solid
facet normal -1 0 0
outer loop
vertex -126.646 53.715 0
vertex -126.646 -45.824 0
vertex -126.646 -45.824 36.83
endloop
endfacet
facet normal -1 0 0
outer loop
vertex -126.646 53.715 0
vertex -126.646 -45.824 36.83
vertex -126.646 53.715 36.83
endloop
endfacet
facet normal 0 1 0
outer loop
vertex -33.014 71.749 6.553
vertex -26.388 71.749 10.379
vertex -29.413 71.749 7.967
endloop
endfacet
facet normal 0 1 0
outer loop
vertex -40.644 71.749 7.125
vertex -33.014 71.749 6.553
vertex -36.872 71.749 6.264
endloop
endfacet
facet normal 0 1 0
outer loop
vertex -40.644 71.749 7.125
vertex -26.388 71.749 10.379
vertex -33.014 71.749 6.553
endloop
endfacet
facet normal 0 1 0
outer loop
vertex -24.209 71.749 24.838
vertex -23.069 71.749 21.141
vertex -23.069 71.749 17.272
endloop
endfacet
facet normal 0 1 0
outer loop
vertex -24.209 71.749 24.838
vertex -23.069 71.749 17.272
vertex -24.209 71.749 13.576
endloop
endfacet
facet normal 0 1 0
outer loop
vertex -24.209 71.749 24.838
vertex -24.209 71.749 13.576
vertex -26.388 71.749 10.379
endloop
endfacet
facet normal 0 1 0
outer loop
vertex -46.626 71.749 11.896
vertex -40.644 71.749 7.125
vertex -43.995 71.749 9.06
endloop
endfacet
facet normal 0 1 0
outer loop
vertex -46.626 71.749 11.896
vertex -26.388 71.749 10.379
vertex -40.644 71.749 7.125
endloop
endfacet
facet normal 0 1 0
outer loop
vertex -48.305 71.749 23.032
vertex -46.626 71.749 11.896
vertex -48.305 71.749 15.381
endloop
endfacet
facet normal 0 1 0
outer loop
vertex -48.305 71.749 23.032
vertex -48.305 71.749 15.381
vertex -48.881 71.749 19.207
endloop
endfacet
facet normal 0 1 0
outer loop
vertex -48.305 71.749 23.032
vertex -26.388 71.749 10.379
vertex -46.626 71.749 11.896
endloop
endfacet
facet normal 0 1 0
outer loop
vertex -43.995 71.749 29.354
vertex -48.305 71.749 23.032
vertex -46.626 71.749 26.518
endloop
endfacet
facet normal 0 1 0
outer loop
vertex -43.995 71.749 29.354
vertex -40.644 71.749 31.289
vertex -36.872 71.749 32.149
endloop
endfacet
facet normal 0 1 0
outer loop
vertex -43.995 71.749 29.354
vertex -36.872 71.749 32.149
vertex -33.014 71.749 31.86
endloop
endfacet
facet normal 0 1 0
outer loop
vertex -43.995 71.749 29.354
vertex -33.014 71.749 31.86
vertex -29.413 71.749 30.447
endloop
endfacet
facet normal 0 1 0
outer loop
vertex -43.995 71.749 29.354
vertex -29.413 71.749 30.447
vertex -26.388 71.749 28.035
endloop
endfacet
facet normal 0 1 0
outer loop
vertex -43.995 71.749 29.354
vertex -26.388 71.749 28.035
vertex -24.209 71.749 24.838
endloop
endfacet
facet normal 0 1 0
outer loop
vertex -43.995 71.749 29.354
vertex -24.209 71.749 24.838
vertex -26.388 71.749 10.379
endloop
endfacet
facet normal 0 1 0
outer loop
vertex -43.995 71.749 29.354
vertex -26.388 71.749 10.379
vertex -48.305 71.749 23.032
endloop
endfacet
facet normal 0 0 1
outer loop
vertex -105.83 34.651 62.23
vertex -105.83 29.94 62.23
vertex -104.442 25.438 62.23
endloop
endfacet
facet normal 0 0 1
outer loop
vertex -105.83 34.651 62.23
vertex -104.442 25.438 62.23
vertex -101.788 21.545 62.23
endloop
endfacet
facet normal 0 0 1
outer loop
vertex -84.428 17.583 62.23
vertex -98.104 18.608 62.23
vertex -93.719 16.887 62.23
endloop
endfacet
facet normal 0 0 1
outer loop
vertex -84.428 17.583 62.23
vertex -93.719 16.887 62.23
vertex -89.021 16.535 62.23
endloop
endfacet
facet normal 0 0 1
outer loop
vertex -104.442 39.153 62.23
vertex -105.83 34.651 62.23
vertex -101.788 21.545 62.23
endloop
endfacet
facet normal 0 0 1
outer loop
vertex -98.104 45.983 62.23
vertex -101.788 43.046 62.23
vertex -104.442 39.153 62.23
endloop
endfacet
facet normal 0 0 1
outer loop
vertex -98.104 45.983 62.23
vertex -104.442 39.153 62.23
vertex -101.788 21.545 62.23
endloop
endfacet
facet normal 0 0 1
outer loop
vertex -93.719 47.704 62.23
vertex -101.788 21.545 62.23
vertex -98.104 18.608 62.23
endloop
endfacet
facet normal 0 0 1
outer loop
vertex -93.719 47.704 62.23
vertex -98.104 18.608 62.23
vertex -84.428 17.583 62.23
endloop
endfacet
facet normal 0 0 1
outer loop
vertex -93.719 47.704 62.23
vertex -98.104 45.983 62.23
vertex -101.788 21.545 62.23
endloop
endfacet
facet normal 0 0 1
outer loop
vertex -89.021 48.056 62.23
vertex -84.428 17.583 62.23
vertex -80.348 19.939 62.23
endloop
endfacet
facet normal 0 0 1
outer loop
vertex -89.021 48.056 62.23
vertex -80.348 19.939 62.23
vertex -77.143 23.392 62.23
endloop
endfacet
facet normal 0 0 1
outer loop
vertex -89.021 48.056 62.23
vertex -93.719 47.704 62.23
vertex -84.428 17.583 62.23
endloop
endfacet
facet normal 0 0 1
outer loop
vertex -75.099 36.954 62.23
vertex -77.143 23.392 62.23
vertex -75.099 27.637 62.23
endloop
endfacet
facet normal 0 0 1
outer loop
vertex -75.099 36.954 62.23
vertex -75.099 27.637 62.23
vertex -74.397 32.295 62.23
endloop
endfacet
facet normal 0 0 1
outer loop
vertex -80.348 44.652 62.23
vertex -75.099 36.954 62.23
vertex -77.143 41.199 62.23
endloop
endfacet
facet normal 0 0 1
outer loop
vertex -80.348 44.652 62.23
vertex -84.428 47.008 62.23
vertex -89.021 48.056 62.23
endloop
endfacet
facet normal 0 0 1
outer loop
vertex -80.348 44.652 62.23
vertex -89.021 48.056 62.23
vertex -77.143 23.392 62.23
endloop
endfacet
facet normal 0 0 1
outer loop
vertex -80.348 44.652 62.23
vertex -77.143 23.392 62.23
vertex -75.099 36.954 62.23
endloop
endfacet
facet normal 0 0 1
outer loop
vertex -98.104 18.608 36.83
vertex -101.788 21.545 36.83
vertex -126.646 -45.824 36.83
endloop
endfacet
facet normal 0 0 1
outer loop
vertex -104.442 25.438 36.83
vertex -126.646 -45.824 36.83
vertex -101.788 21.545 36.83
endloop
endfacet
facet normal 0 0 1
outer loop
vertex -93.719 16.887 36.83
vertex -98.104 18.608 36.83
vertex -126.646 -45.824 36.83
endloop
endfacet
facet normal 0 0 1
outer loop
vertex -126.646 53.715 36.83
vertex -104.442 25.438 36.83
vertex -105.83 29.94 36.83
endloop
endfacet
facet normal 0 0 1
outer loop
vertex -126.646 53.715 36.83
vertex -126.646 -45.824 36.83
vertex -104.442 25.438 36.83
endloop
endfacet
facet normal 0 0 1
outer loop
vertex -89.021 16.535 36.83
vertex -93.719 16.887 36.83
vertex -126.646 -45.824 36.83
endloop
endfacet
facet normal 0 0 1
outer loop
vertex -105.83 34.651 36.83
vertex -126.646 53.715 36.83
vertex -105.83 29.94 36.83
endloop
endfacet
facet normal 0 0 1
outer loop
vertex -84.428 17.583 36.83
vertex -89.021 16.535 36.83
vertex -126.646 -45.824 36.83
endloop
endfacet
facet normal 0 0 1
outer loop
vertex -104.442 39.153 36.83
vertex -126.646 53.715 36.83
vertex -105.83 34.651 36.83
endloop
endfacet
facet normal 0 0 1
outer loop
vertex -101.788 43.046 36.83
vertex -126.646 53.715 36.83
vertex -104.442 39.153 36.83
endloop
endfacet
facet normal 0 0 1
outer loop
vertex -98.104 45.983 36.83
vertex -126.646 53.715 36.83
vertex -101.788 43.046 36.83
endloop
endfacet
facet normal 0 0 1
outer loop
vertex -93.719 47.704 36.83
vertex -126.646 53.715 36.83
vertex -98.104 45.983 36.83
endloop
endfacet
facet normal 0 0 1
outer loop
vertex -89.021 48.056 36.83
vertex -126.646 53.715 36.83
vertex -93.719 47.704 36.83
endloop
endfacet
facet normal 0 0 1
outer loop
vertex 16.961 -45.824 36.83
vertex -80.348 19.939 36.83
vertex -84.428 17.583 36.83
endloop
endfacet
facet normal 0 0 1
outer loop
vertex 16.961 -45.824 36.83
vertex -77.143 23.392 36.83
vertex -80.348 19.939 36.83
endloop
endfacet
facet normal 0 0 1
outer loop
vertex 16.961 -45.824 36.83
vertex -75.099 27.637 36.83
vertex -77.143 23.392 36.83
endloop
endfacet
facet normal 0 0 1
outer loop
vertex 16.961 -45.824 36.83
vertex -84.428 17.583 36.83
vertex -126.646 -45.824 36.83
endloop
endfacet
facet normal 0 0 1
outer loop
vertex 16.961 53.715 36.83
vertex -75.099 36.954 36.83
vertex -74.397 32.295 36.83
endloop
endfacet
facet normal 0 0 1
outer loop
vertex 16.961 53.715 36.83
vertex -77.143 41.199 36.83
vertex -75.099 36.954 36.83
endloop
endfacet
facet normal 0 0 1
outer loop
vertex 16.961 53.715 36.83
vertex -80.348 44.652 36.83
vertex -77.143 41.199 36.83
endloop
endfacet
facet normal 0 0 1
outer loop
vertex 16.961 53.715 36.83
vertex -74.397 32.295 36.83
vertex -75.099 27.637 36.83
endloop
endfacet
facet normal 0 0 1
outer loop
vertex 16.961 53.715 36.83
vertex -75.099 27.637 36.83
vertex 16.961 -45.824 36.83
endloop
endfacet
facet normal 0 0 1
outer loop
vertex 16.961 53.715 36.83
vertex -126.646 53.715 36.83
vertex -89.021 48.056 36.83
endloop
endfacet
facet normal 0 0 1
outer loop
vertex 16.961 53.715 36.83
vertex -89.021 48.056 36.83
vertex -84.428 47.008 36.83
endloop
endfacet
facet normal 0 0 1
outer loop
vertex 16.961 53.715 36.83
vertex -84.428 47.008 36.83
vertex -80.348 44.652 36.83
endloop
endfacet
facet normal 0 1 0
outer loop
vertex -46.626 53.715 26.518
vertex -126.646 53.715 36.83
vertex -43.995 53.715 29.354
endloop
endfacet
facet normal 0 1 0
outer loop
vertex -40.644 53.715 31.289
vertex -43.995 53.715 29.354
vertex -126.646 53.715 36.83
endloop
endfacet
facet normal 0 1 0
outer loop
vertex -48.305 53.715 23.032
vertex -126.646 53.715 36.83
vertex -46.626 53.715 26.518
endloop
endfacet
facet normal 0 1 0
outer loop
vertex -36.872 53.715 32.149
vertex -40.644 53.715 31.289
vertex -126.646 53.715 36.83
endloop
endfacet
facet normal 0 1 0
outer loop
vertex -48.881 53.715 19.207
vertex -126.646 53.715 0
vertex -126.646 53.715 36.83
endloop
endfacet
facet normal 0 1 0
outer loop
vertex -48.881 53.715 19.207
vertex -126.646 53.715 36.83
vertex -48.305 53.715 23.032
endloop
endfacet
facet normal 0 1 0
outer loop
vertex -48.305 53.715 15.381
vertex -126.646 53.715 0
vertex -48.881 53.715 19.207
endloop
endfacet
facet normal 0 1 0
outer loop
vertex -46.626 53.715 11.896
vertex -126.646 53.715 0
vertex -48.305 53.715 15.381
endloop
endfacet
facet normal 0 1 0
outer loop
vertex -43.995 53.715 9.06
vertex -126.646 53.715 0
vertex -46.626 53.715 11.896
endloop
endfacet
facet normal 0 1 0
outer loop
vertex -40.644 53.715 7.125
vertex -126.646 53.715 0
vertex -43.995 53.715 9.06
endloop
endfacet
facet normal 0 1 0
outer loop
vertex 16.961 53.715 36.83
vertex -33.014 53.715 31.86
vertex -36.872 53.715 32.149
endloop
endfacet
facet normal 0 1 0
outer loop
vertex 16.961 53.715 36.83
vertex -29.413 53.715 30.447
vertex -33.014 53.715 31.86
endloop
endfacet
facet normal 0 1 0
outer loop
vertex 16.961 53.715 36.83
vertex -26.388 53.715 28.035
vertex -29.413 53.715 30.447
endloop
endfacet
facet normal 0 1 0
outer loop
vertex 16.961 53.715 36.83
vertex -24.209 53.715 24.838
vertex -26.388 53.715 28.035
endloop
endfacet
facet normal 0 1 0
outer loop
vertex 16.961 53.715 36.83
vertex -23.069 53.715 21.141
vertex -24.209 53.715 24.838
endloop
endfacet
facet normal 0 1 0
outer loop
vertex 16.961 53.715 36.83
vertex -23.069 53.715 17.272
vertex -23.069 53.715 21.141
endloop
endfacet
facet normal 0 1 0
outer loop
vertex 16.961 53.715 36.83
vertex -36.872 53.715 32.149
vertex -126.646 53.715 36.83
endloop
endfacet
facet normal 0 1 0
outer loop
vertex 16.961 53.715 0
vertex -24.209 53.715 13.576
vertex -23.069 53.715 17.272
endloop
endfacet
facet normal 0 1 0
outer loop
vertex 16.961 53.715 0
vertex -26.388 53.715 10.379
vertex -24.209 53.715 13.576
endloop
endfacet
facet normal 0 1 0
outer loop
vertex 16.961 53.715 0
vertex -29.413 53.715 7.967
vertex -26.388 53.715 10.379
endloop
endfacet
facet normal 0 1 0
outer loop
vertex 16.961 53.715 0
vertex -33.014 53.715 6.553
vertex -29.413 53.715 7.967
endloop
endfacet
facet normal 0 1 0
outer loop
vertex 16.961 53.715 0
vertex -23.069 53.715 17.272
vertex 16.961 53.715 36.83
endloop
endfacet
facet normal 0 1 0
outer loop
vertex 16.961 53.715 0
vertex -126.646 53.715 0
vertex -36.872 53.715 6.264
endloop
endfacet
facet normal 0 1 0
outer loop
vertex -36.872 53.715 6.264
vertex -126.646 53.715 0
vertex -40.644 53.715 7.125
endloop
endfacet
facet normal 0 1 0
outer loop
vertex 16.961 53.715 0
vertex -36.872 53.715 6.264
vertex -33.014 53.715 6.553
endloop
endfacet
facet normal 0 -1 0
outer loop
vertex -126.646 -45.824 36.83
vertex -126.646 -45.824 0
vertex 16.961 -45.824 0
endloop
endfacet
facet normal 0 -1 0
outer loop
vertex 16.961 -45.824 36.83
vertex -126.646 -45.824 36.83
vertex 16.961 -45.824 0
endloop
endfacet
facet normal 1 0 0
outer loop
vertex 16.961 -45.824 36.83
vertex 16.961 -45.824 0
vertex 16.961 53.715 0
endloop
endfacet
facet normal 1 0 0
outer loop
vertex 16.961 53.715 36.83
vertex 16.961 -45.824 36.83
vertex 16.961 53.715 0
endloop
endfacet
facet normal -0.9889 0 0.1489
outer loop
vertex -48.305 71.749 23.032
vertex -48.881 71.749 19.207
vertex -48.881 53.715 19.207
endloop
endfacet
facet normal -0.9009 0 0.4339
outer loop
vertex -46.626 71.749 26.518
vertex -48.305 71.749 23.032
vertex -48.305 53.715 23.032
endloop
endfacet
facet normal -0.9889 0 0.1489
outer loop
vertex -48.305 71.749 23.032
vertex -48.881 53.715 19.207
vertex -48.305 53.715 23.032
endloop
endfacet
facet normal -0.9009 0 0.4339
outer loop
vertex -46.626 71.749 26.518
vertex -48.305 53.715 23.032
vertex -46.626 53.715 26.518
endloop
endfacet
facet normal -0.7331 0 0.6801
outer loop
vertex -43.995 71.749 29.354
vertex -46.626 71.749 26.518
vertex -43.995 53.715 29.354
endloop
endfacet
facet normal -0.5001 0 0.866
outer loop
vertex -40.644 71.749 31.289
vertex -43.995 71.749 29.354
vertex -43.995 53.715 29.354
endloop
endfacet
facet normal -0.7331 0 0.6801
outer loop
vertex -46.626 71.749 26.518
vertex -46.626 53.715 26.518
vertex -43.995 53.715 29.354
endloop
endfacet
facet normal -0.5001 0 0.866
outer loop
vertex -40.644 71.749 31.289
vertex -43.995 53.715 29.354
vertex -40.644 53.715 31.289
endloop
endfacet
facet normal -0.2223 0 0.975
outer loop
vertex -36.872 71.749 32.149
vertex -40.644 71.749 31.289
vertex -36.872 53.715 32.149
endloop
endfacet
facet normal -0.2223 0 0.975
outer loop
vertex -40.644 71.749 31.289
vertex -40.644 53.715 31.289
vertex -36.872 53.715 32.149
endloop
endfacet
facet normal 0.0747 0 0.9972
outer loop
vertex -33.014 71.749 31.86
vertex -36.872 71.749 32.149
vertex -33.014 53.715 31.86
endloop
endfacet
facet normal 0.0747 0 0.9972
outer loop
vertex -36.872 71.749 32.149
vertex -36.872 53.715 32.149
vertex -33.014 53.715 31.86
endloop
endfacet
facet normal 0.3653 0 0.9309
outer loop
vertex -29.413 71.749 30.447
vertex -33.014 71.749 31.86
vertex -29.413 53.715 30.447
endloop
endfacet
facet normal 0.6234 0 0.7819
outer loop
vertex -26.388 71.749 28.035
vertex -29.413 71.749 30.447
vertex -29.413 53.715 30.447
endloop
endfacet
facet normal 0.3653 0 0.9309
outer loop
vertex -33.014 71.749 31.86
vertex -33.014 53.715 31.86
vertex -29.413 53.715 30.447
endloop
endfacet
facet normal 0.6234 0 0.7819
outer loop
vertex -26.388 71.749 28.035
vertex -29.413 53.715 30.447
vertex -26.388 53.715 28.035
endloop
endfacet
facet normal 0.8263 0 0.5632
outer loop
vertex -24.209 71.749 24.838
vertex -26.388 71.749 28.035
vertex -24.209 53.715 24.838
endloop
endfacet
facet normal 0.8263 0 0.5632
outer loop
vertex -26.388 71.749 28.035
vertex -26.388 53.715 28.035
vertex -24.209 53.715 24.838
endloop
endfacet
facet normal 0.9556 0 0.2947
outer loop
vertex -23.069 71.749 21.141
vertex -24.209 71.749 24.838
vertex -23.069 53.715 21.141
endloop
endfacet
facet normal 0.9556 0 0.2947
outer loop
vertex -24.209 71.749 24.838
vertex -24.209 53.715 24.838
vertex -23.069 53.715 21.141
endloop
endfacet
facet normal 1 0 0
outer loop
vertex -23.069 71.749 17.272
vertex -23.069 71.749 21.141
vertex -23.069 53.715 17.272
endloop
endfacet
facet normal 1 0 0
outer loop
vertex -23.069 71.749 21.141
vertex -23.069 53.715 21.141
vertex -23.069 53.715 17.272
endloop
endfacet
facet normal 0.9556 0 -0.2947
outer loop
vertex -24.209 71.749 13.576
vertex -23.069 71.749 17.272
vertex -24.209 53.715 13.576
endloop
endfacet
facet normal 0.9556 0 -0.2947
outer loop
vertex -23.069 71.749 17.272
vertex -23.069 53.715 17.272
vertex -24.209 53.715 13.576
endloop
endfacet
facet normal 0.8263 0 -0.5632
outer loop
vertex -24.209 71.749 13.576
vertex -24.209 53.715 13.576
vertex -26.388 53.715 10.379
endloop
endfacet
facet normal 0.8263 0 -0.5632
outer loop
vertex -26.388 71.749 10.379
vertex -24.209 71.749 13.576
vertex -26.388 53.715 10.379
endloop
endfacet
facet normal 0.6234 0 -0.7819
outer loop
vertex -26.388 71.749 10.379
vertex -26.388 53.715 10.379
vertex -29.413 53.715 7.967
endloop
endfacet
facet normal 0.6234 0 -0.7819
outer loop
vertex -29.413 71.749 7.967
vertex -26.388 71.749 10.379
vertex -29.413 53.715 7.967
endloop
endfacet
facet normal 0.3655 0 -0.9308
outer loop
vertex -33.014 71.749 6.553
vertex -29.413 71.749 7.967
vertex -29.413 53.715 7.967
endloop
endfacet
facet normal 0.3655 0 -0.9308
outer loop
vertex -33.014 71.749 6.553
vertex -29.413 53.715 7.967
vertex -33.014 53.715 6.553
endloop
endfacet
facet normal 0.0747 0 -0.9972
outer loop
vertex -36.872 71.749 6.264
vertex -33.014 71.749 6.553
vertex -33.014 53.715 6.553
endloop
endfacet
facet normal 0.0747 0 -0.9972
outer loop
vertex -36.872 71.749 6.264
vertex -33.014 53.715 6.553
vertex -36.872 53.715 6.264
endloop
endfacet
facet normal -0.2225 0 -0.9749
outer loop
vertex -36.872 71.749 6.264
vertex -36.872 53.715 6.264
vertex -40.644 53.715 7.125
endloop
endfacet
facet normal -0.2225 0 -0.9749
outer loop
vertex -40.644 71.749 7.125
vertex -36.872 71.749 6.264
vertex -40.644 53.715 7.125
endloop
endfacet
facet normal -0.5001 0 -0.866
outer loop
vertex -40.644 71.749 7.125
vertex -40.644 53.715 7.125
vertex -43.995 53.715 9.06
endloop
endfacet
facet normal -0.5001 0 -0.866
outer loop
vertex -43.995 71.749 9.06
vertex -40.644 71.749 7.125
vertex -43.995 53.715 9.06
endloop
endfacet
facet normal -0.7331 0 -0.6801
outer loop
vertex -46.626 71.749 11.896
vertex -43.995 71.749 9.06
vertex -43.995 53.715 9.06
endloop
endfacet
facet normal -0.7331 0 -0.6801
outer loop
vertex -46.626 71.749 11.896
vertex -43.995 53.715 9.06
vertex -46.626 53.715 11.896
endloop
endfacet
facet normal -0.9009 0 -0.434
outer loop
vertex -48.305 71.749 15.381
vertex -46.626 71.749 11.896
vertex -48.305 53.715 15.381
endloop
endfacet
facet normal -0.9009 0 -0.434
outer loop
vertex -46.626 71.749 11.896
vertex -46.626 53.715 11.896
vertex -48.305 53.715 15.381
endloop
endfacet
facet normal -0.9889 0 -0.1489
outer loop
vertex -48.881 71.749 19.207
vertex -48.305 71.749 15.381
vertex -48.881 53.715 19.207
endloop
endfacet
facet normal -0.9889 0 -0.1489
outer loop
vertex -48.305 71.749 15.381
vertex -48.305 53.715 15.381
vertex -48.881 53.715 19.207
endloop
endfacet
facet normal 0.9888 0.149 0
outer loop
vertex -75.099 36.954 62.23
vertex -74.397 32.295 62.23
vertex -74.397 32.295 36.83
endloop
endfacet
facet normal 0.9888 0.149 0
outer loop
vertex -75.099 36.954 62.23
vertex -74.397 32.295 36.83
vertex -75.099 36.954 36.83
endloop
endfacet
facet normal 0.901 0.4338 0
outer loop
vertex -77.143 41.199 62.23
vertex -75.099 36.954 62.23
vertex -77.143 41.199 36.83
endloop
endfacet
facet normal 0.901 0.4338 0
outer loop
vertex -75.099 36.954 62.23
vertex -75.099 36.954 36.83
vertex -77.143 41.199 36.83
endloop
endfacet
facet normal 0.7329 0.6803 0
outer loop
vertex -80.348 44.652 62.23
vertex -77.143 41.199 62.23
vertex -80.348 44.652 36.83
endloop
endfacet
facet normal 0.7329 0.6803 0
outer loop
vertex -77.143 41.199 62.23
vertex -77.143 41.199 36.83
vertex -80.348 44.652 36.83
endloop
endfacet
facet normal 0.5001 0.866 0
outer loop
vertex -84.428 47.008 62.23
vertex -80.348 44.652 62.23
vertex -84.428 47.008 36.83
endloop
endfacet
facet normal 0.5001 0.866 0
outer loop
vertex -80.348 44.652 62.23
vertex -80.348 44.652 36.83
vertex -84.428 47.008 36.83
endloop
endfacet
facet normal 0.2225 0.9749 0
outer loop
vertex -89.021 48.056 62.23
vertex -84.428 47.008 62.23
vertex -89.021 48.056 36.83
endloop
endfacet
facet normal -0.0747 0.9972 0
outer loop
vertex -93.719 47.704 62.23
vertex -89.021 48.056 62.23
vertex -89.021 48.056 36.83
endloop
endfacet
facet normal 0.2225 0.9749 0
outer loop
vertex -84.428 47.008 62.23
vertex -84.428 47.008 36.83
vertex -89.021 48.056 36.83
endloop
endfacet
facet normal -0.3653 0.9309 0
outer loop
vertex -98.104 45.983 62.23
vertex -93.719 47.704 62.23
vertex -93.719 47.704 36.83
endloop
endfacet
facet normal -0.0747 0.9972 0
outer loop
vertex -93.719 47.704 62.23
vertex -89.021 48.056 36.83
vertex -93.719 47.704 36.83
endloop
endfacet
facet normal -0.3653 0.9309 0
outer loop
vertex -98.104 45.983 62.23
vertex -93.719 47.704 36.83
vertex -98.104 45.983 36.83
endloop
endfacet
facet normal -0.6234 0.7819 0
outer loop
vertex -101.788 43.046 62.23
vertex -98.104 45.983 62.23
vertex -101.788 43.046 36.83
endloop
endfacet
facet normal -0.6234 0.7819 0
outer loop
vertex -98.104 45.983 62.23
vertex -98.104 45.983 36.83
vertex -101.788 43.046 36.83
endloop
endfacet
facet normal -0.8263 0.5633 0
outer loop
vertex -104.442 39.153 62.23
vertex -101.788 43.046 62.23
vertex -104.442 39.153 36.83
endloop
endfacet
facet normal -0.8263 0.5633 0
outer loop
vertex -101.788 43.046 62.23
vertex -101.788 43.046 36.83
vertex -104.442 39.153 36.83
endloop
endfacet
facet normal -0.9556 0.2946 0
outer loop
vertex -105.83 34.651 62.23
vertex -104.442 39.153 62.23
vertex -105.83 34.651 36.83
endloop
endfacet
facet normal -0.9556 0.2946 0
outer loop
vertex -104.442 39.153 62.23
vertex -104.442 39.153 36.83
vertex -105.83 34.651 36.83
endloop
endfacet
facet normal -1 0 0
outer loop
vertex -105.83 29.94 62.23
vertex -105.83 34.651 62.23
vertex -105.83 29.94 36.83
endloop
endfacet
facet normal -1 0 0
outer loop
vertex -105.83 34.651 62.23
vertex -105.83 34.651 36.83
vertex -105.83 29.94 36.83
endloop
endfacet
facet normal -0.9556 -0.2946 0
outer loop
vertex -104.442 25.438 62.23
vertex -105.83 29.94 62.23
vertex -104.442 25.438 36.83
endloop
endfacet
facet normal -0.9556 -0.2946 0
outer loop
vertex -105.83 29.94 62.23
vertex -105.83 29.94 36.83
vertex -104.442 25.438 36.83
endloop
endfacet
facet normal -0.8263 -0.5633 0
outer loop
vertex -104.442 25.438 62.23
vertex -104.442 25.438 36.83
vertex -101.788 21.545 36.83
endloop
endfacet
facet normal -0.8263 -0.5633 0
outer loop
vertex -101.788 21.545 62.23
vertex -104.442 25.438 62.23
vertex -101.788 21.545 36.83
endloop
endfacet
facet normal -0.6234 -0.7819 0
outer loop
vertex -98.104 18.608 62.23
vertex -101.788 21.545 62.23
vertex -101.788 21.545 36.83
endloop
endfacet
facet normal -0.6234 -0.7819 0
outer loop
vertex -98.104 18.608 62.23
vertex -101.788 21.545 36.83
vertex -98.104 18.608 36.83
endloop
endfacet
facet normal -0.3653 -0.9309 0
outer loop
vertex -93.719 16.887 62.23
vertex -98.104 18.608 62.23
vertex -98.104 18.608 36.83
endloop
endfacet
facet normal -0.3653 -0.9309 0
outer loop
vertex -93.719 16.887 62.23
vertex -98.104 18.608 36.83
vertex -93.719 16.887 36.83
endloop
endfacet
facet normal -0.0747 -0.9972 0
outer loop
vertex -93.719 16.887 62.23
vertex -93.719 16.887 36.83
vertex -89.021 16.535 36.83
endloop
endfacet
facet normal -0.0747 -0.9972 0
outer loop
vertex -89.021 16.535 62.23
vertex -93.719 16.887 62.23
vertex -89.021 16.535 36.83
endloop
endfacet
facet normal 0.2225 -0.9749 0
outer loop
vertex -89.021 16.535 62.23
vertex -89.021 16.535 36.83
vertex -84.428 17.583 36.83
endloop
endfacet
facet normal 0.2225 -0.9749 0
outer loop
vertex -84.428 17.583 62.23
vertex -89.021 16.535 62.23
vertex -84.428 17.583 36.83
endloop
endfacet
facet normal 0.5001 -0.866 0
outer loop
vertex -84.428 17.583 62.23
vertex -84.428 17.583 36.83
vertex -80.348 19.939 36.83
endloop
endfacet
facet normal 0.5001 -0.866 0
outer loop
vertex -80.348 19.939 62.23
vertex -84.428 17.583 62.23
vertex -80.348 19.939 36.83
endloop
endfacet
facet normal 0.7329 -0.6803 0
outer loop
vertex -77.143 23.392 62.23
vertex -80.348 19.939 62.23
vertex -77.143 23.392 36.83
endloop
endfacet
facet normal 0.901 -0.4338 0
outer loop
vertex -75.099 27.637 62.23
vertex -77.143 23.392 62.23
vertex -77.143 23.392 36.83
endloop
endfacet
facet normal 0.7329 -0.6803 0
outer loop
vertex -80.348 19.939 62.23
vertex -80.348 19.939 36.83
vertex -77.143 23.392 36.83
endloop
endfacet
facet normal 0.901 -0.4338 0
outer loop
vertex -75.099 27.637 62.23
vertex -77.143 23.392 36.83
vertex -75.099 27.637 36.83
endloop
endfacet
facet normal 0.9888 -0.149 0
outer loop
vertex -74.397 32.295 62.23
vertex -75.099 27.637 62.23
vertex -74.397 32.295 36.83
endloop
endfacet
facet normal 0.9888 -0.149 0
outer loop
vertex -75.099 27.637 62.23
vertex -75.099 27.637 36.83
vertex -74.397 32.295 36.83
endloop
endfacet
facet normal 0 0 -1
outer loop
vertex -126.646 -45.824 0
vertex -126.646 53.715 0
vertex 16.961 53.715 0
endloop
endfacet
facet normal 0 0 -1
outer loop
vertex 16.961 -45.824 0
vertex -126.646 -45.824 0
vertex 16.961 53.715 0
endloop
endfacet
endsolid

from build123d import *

# Parameters (mm, degrees)
F0_W     = 143.607307
F0_H     = 99.53899
F1_DEPTH = 36.83
F2_R     = 15.804954
F3_DEPTH = 25.4
F4_R     = 12.978901
F5_DEPTH = 18.034


with BuildPart() as f1:
    # F0 (on Top) → F1 (new body)
    with BuildSketch(Plane.XY):
        with Locations((-54.842492, 3.94509)):
            Rectangle(F0_W, F0_H)
    extrude(amount=F1_DEPTH)

    # F2 (on face) → F3 (join)
    with BuildSketch(Plane.XY.offset(36.83)):
        with Locations((-90.201773, 32.295499)):
            Circle(F2_R)
    extrude(amount=F3_DEPTH)

    # F4 (on face) → F5 (join)
    with BuildSketch(Plane(origin=(0, 53.714585, 0), x_dir=(-1, 0, 0), z_dir=(0, 1, 0))):
        with Locations((35.902489, 19.206859)):
            Circle(F4_R)
    extrude(amount=F5_DEPTH)


solid = f1.part
